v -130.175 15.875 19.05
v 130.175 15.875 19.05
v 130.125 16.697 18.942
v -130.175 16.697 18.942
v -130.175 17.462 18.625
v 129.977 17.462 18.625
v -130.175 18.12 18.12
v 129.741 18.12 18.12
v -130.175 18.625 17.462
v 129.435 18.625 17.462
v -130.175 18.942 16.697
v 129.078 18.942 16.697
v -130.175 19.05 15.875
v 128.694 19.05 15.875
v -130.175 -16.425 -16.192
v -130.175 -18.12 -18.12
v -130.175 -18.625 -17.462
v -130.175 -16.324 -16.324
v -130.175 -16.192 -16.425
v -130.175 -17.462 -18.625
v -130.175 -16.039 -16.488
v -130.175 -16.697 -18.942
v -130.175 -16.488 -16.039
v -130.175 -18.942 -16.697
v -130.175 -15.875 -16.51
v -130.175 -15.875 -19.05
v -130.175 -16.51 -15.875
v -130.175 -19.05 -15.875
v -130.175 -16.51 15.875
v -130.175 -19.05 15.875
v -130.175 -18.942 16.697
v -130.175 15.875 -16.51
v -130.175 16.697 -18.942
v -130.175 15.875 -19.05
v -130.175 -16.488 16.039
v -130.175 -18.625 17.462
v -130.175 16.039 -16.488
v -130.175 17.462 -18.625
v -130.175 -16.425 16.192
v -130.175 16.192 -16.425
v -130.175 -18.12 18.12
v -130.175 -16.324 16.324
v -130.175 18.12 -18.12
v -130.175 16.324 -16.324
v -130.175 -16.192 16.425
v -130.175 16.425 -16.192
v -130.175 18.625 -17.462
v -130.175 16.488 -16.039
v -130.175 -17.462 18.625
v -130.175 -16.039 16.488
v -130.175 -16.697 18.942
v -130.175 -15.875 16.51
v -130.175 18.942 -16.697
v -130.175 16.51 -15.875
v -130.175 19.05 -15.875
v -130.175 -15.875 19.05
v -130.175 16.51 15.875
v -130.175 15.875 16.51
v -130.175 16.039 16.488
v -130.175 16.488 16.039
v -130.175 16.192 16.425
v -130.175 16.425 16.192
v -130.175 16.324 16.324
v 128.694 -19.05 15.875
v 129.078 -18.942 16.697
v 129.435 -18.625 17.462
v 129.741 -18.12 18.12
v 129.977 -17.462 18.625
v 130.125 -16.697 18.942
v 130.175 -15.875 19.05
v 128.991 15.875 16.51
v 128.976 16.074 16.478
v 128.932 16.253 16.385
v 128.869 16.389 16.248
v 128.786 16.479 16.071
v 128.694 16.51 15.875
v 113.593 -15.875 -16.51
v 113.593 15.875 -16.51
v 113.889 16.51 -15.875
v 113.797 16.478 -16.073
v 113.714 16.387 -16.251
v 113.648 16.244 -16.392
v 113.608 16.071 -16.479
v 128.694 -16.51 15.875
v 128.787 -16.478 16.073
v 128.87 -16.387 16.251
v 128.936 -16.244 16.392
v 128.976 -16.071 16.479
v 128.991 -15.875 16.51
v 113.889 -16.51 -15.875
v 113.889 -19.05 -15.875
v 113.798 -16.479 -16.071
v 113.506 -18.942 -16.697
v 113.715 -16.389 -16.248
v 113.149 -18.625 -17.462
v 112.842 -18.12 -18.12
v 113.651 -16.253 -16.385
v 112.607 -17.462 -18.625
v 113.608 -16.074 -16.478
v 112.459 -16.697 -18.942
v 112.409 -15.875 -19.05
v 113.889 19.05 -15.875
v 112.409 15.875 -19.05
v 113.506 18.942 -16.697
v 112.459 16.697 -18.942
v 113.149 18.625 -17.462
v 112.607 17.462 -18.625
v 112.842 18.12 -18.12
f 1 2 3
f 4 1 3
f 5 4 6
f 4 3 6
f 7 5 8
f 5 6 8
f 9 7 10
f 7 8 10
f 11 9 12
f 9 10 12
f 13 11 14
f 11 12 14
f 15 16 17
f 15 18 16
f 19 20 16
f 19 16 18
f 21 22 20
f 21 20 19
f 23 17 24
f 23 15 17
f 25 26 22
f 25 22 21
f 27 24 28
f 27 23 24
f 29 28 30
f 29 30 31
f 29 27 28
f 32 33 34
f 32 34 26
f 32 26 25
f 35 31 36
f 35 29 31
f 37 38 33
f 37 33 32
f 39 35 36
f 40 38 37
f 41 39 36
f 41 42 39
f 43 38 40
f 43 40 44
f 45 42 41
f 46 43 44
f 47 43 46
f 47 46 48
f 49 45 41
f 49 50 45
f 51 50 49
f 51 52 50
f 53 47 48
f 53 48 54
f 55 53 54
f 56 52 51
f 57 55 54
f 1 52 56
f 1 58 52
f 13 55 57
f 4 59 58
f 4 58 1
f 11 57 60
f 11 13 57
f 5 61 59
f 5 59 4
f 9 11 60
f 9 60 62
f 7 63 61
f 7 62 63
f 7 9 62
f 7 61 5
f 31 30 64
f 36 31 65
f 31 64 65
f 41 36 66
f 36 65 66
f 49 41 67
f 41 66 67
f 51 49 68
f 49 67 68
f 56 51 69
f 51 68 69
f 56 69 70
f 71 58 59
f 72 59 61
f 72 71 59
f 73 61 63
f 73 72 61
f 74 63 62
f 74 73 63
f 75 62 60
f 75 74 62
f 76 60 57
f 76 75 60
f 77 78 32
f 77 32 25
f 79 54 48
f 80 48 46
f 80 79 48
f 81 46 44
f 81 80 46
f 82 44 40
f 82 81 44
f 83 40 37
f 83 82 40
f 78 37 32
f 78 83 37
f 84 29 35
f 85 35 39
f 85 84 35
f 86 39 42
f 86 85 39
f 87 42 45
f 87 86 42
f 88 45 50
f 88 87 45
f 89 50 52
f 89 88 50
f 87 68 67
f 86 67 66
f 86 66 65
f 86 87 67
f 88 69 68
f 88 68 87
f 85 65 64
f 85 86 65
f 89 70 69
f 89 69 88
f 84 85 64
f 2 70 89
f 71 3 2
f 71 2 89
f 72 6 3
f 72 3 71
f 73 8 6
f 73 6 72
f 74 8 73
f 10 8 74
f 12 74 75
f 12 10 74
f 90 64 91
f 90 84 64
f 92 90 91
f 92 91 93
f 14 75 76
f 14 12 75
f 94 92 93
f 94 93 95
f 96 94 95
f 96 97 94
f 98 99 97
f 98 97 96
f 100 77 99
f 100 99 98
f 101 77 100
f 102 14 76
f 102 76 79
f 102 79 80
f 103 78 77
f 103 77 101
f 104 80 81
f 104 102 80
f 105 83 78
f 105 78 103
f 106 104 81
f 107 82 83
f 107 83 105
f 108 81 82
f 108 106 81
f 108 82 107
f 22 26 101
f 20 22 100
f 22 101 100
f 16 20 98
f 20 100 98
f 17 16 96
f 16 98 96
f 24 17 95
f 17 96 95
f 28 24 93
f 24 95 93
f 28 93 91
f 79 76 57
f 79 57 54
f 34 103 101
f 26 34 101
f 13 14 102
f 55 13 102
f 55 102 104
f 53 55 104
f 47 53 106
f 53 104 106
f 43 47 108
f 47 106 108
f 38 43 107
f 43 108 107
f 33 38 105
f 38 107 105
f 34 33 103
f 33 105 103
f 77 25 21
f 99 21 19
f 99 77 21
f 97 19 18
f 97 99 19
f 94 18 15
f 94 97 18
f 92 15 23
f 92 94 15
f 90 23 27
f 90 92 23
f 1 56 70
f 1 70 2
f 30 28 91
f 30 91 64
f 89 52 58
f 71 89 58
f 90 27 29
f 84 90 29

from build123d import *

# Parameters (mm, degrees)
EXTRUDE_THIN1_DEPTH     = 130.175
CUT_EXTRUDE1_DEPTH      = 1
CUT_EXTRUDE1_DEPTH_BACK = 39.1


with BuildPart() as part:
    # Sketch1 → Extrude-Thin1 (new body, symmetric)
    with BuildSketch(Plane(origin=(0, 0, 0), x_dir=(0, 0, -1), z_dir=(1, 0, 0))):
        with BuildLine():
            Line((-15.875, 19.05), (15.875, 19.05))
            ThreePointArc((15.875, 19.05), (18.12006403, 18.12006403), (19.05, 15.875))
            Line((19.05, 15.875), (19.05, -15.875))
            ThreePointArc((19.05, -15.875), (18.12006403, -18.12006403), (15.875, -19.05))
            Line((15.875, -19.05), (-15.875, -19.05))
            ThreePointArc((-15.875, -19.05), (-18.12006403, -18.12006403), (-19.05, -15.875))
            Line((-19.05, -15.875), (-19.05, 15.875))
            ThreePointArc((-19.05, 15.875), (-18.12006403, 18.12006403), (-15.875, 19.05))
        make_face()
        with BuildLine():
            Line((-15.875, 16.51), (15.875, 16.51))
            ThreePointArc((15.875, 16.51), (16.324012806, 16.324012806), (16.51, 15.875))
            Line((16.51, 15.875), (16.51, -15.875))
            ThreePointArc((16.51, -15.875), (16.324012806, -16.324012806), (15.875, -16.51))
            Line((15.875, -16.51), (-15.875, -16.51))
            ThreePointArc((-15.875, -16.51), (-16.324012806, -16.324012806), (-16.51, -15.875))
            Line((-16.51, -15.875), (-16.51, 15.875))
            ThreePointArc((-16.51, 15.875), (-16.324012806, 16.324012806), (-15.875, 16.51))
        make_face(mode=Mode.SUBTRACT)
    extrude(amount=EXTRUDE_THIN1_DEPTH, both=True)

    # Sketch3 → Cut-Extrude1 (cut, two sides)
    with BuildSketch(Plane(origin=(0, 19.05, 0), x_dir=(1, 0, 0), z_dir=(0, 1, 0))) as cut_extrude1_sk:
        Polygon((356.802383498, -505.053992289), (130.175, -19.05), (112.408678224, 19.05), (-114.218705274, 505.053992289), (857.789279304, 958.308759286), (1328.810368077, -51.799225292), align=None)
    extrude(amount=CUT_EXTRUDE1_DEPTH, mode=Mode.SUBTRACT)
    extrude(cut_extrude1_sk.sketch, amount=-CUT_EXTRUDE1_DEPTH_BACK, mode=Mode.SUBTRACT)


solid = part.part
